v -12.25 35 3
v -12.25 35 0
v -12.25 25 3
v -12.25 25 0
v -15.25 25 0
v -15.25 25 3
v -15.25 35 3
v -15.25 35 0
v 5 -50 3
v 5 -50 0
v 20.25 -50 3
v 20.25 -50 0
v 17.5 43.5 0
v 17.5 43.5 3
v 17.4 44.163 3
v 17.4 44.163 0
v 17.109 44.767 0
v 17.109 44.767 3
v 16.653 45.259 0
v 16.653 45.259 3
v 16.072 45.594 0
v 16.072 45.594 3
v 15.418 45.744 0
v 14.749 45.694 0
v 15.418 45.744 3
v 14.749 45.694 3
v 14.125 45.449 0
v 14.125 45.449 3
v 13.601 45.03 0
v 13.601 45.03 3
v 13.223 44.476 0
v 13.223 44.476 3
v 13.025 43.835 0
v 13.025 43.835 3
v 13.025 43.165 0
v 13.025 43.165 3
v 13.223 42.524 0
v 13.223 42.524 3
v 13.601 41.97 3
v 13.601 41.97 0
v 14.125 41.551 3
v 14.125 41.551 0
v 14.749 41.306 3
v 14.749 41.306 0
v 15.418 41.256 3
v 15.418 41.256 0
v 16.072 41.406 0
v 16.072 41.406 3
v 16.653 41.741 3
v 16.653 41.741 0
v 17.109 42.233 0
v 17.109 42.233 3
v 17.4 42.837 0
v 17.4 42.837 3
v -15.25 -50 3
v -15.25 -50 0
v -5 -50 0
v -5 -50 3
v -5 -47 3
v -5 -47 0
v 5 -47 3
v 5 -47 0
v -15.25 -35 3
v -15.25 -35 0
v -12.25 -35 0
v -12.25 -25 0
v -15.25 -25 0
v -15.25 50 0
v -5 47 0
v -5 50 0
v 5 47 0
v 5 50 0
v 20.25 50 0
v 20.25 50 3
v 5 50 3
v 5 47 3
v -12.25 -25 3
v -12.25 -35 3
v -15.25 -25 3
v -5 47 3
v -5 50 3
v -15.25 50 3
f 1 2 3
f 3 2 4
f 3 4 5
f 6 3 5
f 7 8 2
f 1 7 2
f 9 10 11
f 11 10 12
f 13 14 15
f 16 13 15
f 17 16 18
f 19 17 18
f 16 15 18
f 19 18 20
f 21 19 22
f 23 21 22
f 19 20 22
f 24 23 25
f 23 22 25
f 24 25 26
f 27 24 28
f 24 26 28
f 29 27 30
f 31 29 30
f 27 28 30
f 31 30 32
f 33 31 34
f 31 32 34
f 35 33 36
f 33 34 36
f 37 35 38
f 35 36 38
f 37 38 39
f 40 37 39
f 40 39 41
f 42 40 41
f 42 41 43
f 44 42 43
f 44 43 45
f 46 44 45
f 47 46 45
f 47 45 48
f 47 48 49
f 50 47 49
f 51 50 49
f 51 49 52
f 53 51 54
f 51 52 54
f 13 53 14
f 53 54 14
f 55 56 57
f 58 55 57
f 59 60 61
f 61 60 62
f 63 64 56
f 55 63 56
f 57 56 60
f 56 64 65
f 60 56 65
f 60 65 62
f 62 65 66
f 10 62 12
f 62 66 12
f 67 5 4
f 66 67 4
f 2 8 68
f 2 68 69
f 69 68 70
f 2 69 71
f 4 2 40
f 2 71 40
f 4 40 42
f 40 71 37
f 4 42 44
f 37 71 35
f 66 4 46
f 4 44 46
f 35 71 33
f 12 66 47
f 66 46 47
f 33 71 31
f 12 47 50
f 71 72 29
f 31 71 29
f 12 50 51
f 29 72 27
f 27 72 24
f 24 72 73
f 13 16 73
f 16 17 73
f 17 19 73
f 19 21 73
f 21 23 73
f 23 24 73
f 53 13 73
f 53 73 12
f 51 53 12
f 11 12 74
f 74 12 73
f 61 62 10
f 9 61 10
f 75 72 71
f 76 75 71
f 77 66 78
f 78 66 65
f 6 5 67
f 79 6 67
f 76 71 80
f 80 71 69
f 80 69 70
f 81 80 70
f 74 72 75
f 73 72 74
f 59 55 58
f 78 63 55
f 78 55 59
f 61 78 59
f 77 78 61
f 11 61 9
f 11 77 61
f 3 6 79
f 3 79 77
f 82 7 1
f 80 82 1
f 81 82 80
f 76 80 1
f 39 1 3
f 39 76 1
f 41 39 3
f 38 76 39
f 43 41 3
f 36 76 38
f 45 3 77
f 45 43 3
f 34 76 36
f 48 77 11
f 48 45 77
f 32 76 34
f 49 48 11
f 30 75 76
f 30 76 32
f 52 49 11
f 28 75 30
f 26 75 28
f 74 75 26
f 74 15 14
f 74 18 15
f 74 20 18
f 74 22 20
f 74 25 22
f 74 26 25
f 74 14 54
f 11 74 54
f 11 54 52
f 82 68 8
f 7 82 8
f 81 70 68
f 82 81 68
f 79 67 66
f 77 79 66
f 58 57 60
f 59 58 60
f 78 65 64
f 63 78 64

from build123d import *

# Parameters (mm, degrees)
BOSS_EXTRUDE1_DEPTH = 3
SKETCH2_W           = 5
SKETCH2_H           = 100
BOSS_EXTRUDE2_DEPTH = 3
SKETCH3_R           = 2.25
CUT_EXTRUDE1_DEPTH  = 3


with BuildPart() as part:
    # Sketch1 → Boss-Extrude1 (new body)
    with BuildSketch(Plane.XY):
        Polygon((-15.25, 50), (-15.25, 35), (-12.25, 35), (-12.25, 25), (-15.25, 25), (-15.25, -25), (-12.25, -25), (-12.25, -35), (-15.25, -35), (-15.25, -50), (-5, -50), (-5, -47), (5, -47), (5, -50), (15.25, -50), (15.25, 50), (5, 50), (5, 47), (-5, 47), (-5, 50), align=None)
    extrude(amount=BOSS_EXTRUDE1_DEPTH)

    # Sketch2 → Boss-Extrude2 (add)
    with BuildSketch(Plane.XY):
        with Locations((17.75, 0)):
            Rectangle(SKETCH2_W, SKETCH2_H)
    extrude(amount=BOSS_EXTRUDE2_DEPTH)

    # Sketch3 → Cut-Extrude1 (cut)
    with BuildSketch(Plane.XY.offset(3)):
        with Locations((15.25, 43.5)):
            Circle(SKETCH3_R)
    extrude(amount=-CUT_EXTRUDE1_DEPTH, mode=Mode.SUBTRACT)


solid = part.part
